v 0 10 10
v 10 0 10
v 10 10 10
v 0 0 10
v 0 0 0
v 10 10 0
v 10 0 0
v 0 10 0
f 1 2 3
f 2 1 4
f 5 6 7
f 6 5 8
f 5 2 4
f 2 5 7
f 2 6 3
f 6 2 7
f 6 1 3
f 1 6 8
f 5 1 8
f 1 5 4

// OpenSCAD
_h=1.55;
_d=23.2;
_s=3;

cube(10);

linear_extrude(file="rakete.dxf", height = 10, center = true, convexity = 10);

// _outer();

module _outer() {
	union() {
		difference() {
			cylinder(h=_h, r=_d/2);
			cylinder(h=_h, r=_d/2-_s);
			for (i=[0:19]) {
				rotate(a=[0, 0, i*18]) translate([_d/2-_s/2, 0, _h-0.5]) _star(0.3, 1.1, 0.5);
			}
		}
	}
}

module _star(r1, r2, h) {
	union() {
		for(i=[0:4]) {
			rotate(a=[0, 0, i*72]) _ray(r1, r2, h);
		}
	}
}

module _ray(r1, r2, h) {
	translate([0, 0, h/2]) {
		linear_extrude(height=h, center=true) {
			rotate(-90) polygon([[0,r2], [-r1,0], [r1,0]]);
		}
	}
}
